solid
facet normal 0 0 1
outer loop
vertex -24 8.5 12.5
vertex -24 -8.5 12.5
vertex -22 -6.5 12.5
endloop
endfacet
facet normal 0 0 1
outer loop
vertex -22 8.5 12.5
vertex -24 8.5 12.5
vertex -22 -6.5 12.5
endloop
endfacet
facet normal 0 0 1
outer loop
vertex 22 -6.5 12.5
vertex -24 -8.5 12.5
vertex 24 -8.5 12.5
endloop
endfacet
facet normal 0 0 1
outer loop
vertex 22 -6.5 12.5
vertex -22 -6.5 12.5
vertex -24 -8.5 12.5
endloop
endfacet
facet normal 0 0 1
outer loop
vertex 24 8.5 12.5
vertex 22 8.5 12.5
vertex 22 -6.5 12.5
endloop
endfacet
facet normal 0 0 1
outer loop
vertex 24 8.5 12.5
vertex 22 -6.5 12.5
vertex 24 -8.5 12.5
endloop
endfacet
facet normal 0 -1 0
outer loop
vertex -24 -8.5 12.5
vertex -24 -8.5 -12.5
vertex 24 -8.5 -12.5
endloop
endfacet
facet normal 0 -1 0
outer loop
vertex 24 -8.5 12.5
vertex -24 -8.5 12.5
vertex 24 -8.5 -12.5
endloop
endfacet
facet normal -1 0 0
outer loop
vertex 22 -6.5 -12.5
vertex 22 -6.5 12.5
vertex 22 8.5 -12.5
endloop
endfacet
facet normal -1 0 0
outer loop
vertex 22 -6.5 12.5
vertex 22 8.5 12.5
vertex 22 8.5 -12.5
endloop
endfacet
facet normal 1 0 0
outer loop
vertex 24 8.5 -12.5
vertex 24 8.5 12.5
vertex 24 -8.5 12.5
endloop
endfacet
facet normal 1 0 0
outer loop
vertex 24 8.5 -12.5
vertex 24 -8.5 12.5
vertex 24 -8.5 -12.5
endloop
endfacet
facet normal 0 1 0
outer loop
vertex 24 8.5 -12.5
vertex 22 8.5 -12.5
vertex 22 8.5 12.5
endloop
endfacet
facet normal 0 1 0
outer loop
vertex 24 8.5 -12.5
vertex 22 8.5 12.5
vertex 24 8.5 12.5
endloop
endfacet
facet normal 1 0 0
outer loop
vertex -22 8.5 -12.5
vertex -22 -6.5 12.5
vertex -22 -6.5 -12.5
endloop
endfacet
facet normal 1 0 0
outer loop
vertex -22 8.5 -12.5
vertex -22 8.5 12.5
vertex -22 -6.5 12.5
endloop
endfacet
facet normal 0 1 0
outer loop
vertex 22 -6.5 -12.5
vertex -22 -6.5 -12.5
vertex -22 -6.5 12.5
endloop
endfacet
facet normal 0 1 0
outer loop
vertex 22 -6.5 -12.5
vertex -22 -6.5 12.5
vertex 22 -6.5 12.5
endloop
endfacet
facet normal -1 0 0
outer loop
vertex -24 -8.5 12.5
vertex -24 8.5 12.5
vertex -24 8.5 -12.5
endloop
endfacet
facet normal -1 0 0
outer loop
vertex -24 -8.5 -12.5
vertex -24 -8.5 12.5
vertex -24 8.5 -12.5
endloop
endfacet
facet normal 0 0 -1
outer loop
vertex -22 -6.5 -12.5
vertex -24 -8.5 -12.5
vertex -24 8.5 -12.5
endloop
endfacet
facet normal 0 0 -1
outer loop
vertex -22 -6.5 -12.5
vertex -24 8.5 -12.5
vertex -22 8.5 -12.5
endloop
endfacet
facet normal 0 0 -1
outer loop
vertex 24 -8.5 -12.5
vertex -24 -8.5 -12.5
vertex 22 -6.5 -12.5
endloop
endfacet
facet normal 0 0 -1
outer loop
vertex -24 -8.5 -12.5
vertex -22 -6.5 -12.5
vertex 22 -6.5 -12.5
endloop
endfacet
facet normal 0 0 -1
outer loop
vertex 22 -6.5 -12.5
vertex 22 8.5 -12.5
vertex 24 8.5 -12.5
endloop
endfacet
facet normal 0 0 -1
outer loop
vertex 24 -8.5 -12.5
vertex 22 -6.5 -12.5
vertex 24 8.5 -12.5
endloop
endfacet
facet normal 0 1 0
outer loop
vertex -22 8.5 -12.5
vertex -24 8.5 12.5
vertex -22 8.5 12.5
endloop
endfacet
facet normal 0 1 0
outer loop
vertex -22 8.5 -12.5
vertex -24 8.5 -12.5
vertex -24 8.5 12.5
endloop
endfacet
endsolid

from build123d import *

# Parameters (mm, degrees)
ESBO_O1_W                = 48
ESBO_O1_H                = 25
RESSALTO_EXTRUS_O1_DEPTH = 8.5
CASCA1_T                 = -2


with BuildPart() as part:
    # Esboço1 → Ressalto-extrusão1 (new, symmetric)
    with BuildSketch(Plane(origin=(0, 0, 0), x_dir=(1, 0, 0), z_dir=(0, 1, 0))):
        Rectangle(ESBO_O1_W, ESBO_O1_H)
    extrude(amount=RESSALTO_EXTRUS_O1_DEPTH, both=True)

    # Casca1
    casca1_openings = [part.faces().sort_by_distance(p)[0] for p in [
        (0, 8.5, 0),
        (0, 0, 12.5),
        (0, 0, -12.5),
    ]]
    offset(amount=CASCA1_T, openings=casca1_openings, kind=Kind.INTERSECTION)


solid = part.part
